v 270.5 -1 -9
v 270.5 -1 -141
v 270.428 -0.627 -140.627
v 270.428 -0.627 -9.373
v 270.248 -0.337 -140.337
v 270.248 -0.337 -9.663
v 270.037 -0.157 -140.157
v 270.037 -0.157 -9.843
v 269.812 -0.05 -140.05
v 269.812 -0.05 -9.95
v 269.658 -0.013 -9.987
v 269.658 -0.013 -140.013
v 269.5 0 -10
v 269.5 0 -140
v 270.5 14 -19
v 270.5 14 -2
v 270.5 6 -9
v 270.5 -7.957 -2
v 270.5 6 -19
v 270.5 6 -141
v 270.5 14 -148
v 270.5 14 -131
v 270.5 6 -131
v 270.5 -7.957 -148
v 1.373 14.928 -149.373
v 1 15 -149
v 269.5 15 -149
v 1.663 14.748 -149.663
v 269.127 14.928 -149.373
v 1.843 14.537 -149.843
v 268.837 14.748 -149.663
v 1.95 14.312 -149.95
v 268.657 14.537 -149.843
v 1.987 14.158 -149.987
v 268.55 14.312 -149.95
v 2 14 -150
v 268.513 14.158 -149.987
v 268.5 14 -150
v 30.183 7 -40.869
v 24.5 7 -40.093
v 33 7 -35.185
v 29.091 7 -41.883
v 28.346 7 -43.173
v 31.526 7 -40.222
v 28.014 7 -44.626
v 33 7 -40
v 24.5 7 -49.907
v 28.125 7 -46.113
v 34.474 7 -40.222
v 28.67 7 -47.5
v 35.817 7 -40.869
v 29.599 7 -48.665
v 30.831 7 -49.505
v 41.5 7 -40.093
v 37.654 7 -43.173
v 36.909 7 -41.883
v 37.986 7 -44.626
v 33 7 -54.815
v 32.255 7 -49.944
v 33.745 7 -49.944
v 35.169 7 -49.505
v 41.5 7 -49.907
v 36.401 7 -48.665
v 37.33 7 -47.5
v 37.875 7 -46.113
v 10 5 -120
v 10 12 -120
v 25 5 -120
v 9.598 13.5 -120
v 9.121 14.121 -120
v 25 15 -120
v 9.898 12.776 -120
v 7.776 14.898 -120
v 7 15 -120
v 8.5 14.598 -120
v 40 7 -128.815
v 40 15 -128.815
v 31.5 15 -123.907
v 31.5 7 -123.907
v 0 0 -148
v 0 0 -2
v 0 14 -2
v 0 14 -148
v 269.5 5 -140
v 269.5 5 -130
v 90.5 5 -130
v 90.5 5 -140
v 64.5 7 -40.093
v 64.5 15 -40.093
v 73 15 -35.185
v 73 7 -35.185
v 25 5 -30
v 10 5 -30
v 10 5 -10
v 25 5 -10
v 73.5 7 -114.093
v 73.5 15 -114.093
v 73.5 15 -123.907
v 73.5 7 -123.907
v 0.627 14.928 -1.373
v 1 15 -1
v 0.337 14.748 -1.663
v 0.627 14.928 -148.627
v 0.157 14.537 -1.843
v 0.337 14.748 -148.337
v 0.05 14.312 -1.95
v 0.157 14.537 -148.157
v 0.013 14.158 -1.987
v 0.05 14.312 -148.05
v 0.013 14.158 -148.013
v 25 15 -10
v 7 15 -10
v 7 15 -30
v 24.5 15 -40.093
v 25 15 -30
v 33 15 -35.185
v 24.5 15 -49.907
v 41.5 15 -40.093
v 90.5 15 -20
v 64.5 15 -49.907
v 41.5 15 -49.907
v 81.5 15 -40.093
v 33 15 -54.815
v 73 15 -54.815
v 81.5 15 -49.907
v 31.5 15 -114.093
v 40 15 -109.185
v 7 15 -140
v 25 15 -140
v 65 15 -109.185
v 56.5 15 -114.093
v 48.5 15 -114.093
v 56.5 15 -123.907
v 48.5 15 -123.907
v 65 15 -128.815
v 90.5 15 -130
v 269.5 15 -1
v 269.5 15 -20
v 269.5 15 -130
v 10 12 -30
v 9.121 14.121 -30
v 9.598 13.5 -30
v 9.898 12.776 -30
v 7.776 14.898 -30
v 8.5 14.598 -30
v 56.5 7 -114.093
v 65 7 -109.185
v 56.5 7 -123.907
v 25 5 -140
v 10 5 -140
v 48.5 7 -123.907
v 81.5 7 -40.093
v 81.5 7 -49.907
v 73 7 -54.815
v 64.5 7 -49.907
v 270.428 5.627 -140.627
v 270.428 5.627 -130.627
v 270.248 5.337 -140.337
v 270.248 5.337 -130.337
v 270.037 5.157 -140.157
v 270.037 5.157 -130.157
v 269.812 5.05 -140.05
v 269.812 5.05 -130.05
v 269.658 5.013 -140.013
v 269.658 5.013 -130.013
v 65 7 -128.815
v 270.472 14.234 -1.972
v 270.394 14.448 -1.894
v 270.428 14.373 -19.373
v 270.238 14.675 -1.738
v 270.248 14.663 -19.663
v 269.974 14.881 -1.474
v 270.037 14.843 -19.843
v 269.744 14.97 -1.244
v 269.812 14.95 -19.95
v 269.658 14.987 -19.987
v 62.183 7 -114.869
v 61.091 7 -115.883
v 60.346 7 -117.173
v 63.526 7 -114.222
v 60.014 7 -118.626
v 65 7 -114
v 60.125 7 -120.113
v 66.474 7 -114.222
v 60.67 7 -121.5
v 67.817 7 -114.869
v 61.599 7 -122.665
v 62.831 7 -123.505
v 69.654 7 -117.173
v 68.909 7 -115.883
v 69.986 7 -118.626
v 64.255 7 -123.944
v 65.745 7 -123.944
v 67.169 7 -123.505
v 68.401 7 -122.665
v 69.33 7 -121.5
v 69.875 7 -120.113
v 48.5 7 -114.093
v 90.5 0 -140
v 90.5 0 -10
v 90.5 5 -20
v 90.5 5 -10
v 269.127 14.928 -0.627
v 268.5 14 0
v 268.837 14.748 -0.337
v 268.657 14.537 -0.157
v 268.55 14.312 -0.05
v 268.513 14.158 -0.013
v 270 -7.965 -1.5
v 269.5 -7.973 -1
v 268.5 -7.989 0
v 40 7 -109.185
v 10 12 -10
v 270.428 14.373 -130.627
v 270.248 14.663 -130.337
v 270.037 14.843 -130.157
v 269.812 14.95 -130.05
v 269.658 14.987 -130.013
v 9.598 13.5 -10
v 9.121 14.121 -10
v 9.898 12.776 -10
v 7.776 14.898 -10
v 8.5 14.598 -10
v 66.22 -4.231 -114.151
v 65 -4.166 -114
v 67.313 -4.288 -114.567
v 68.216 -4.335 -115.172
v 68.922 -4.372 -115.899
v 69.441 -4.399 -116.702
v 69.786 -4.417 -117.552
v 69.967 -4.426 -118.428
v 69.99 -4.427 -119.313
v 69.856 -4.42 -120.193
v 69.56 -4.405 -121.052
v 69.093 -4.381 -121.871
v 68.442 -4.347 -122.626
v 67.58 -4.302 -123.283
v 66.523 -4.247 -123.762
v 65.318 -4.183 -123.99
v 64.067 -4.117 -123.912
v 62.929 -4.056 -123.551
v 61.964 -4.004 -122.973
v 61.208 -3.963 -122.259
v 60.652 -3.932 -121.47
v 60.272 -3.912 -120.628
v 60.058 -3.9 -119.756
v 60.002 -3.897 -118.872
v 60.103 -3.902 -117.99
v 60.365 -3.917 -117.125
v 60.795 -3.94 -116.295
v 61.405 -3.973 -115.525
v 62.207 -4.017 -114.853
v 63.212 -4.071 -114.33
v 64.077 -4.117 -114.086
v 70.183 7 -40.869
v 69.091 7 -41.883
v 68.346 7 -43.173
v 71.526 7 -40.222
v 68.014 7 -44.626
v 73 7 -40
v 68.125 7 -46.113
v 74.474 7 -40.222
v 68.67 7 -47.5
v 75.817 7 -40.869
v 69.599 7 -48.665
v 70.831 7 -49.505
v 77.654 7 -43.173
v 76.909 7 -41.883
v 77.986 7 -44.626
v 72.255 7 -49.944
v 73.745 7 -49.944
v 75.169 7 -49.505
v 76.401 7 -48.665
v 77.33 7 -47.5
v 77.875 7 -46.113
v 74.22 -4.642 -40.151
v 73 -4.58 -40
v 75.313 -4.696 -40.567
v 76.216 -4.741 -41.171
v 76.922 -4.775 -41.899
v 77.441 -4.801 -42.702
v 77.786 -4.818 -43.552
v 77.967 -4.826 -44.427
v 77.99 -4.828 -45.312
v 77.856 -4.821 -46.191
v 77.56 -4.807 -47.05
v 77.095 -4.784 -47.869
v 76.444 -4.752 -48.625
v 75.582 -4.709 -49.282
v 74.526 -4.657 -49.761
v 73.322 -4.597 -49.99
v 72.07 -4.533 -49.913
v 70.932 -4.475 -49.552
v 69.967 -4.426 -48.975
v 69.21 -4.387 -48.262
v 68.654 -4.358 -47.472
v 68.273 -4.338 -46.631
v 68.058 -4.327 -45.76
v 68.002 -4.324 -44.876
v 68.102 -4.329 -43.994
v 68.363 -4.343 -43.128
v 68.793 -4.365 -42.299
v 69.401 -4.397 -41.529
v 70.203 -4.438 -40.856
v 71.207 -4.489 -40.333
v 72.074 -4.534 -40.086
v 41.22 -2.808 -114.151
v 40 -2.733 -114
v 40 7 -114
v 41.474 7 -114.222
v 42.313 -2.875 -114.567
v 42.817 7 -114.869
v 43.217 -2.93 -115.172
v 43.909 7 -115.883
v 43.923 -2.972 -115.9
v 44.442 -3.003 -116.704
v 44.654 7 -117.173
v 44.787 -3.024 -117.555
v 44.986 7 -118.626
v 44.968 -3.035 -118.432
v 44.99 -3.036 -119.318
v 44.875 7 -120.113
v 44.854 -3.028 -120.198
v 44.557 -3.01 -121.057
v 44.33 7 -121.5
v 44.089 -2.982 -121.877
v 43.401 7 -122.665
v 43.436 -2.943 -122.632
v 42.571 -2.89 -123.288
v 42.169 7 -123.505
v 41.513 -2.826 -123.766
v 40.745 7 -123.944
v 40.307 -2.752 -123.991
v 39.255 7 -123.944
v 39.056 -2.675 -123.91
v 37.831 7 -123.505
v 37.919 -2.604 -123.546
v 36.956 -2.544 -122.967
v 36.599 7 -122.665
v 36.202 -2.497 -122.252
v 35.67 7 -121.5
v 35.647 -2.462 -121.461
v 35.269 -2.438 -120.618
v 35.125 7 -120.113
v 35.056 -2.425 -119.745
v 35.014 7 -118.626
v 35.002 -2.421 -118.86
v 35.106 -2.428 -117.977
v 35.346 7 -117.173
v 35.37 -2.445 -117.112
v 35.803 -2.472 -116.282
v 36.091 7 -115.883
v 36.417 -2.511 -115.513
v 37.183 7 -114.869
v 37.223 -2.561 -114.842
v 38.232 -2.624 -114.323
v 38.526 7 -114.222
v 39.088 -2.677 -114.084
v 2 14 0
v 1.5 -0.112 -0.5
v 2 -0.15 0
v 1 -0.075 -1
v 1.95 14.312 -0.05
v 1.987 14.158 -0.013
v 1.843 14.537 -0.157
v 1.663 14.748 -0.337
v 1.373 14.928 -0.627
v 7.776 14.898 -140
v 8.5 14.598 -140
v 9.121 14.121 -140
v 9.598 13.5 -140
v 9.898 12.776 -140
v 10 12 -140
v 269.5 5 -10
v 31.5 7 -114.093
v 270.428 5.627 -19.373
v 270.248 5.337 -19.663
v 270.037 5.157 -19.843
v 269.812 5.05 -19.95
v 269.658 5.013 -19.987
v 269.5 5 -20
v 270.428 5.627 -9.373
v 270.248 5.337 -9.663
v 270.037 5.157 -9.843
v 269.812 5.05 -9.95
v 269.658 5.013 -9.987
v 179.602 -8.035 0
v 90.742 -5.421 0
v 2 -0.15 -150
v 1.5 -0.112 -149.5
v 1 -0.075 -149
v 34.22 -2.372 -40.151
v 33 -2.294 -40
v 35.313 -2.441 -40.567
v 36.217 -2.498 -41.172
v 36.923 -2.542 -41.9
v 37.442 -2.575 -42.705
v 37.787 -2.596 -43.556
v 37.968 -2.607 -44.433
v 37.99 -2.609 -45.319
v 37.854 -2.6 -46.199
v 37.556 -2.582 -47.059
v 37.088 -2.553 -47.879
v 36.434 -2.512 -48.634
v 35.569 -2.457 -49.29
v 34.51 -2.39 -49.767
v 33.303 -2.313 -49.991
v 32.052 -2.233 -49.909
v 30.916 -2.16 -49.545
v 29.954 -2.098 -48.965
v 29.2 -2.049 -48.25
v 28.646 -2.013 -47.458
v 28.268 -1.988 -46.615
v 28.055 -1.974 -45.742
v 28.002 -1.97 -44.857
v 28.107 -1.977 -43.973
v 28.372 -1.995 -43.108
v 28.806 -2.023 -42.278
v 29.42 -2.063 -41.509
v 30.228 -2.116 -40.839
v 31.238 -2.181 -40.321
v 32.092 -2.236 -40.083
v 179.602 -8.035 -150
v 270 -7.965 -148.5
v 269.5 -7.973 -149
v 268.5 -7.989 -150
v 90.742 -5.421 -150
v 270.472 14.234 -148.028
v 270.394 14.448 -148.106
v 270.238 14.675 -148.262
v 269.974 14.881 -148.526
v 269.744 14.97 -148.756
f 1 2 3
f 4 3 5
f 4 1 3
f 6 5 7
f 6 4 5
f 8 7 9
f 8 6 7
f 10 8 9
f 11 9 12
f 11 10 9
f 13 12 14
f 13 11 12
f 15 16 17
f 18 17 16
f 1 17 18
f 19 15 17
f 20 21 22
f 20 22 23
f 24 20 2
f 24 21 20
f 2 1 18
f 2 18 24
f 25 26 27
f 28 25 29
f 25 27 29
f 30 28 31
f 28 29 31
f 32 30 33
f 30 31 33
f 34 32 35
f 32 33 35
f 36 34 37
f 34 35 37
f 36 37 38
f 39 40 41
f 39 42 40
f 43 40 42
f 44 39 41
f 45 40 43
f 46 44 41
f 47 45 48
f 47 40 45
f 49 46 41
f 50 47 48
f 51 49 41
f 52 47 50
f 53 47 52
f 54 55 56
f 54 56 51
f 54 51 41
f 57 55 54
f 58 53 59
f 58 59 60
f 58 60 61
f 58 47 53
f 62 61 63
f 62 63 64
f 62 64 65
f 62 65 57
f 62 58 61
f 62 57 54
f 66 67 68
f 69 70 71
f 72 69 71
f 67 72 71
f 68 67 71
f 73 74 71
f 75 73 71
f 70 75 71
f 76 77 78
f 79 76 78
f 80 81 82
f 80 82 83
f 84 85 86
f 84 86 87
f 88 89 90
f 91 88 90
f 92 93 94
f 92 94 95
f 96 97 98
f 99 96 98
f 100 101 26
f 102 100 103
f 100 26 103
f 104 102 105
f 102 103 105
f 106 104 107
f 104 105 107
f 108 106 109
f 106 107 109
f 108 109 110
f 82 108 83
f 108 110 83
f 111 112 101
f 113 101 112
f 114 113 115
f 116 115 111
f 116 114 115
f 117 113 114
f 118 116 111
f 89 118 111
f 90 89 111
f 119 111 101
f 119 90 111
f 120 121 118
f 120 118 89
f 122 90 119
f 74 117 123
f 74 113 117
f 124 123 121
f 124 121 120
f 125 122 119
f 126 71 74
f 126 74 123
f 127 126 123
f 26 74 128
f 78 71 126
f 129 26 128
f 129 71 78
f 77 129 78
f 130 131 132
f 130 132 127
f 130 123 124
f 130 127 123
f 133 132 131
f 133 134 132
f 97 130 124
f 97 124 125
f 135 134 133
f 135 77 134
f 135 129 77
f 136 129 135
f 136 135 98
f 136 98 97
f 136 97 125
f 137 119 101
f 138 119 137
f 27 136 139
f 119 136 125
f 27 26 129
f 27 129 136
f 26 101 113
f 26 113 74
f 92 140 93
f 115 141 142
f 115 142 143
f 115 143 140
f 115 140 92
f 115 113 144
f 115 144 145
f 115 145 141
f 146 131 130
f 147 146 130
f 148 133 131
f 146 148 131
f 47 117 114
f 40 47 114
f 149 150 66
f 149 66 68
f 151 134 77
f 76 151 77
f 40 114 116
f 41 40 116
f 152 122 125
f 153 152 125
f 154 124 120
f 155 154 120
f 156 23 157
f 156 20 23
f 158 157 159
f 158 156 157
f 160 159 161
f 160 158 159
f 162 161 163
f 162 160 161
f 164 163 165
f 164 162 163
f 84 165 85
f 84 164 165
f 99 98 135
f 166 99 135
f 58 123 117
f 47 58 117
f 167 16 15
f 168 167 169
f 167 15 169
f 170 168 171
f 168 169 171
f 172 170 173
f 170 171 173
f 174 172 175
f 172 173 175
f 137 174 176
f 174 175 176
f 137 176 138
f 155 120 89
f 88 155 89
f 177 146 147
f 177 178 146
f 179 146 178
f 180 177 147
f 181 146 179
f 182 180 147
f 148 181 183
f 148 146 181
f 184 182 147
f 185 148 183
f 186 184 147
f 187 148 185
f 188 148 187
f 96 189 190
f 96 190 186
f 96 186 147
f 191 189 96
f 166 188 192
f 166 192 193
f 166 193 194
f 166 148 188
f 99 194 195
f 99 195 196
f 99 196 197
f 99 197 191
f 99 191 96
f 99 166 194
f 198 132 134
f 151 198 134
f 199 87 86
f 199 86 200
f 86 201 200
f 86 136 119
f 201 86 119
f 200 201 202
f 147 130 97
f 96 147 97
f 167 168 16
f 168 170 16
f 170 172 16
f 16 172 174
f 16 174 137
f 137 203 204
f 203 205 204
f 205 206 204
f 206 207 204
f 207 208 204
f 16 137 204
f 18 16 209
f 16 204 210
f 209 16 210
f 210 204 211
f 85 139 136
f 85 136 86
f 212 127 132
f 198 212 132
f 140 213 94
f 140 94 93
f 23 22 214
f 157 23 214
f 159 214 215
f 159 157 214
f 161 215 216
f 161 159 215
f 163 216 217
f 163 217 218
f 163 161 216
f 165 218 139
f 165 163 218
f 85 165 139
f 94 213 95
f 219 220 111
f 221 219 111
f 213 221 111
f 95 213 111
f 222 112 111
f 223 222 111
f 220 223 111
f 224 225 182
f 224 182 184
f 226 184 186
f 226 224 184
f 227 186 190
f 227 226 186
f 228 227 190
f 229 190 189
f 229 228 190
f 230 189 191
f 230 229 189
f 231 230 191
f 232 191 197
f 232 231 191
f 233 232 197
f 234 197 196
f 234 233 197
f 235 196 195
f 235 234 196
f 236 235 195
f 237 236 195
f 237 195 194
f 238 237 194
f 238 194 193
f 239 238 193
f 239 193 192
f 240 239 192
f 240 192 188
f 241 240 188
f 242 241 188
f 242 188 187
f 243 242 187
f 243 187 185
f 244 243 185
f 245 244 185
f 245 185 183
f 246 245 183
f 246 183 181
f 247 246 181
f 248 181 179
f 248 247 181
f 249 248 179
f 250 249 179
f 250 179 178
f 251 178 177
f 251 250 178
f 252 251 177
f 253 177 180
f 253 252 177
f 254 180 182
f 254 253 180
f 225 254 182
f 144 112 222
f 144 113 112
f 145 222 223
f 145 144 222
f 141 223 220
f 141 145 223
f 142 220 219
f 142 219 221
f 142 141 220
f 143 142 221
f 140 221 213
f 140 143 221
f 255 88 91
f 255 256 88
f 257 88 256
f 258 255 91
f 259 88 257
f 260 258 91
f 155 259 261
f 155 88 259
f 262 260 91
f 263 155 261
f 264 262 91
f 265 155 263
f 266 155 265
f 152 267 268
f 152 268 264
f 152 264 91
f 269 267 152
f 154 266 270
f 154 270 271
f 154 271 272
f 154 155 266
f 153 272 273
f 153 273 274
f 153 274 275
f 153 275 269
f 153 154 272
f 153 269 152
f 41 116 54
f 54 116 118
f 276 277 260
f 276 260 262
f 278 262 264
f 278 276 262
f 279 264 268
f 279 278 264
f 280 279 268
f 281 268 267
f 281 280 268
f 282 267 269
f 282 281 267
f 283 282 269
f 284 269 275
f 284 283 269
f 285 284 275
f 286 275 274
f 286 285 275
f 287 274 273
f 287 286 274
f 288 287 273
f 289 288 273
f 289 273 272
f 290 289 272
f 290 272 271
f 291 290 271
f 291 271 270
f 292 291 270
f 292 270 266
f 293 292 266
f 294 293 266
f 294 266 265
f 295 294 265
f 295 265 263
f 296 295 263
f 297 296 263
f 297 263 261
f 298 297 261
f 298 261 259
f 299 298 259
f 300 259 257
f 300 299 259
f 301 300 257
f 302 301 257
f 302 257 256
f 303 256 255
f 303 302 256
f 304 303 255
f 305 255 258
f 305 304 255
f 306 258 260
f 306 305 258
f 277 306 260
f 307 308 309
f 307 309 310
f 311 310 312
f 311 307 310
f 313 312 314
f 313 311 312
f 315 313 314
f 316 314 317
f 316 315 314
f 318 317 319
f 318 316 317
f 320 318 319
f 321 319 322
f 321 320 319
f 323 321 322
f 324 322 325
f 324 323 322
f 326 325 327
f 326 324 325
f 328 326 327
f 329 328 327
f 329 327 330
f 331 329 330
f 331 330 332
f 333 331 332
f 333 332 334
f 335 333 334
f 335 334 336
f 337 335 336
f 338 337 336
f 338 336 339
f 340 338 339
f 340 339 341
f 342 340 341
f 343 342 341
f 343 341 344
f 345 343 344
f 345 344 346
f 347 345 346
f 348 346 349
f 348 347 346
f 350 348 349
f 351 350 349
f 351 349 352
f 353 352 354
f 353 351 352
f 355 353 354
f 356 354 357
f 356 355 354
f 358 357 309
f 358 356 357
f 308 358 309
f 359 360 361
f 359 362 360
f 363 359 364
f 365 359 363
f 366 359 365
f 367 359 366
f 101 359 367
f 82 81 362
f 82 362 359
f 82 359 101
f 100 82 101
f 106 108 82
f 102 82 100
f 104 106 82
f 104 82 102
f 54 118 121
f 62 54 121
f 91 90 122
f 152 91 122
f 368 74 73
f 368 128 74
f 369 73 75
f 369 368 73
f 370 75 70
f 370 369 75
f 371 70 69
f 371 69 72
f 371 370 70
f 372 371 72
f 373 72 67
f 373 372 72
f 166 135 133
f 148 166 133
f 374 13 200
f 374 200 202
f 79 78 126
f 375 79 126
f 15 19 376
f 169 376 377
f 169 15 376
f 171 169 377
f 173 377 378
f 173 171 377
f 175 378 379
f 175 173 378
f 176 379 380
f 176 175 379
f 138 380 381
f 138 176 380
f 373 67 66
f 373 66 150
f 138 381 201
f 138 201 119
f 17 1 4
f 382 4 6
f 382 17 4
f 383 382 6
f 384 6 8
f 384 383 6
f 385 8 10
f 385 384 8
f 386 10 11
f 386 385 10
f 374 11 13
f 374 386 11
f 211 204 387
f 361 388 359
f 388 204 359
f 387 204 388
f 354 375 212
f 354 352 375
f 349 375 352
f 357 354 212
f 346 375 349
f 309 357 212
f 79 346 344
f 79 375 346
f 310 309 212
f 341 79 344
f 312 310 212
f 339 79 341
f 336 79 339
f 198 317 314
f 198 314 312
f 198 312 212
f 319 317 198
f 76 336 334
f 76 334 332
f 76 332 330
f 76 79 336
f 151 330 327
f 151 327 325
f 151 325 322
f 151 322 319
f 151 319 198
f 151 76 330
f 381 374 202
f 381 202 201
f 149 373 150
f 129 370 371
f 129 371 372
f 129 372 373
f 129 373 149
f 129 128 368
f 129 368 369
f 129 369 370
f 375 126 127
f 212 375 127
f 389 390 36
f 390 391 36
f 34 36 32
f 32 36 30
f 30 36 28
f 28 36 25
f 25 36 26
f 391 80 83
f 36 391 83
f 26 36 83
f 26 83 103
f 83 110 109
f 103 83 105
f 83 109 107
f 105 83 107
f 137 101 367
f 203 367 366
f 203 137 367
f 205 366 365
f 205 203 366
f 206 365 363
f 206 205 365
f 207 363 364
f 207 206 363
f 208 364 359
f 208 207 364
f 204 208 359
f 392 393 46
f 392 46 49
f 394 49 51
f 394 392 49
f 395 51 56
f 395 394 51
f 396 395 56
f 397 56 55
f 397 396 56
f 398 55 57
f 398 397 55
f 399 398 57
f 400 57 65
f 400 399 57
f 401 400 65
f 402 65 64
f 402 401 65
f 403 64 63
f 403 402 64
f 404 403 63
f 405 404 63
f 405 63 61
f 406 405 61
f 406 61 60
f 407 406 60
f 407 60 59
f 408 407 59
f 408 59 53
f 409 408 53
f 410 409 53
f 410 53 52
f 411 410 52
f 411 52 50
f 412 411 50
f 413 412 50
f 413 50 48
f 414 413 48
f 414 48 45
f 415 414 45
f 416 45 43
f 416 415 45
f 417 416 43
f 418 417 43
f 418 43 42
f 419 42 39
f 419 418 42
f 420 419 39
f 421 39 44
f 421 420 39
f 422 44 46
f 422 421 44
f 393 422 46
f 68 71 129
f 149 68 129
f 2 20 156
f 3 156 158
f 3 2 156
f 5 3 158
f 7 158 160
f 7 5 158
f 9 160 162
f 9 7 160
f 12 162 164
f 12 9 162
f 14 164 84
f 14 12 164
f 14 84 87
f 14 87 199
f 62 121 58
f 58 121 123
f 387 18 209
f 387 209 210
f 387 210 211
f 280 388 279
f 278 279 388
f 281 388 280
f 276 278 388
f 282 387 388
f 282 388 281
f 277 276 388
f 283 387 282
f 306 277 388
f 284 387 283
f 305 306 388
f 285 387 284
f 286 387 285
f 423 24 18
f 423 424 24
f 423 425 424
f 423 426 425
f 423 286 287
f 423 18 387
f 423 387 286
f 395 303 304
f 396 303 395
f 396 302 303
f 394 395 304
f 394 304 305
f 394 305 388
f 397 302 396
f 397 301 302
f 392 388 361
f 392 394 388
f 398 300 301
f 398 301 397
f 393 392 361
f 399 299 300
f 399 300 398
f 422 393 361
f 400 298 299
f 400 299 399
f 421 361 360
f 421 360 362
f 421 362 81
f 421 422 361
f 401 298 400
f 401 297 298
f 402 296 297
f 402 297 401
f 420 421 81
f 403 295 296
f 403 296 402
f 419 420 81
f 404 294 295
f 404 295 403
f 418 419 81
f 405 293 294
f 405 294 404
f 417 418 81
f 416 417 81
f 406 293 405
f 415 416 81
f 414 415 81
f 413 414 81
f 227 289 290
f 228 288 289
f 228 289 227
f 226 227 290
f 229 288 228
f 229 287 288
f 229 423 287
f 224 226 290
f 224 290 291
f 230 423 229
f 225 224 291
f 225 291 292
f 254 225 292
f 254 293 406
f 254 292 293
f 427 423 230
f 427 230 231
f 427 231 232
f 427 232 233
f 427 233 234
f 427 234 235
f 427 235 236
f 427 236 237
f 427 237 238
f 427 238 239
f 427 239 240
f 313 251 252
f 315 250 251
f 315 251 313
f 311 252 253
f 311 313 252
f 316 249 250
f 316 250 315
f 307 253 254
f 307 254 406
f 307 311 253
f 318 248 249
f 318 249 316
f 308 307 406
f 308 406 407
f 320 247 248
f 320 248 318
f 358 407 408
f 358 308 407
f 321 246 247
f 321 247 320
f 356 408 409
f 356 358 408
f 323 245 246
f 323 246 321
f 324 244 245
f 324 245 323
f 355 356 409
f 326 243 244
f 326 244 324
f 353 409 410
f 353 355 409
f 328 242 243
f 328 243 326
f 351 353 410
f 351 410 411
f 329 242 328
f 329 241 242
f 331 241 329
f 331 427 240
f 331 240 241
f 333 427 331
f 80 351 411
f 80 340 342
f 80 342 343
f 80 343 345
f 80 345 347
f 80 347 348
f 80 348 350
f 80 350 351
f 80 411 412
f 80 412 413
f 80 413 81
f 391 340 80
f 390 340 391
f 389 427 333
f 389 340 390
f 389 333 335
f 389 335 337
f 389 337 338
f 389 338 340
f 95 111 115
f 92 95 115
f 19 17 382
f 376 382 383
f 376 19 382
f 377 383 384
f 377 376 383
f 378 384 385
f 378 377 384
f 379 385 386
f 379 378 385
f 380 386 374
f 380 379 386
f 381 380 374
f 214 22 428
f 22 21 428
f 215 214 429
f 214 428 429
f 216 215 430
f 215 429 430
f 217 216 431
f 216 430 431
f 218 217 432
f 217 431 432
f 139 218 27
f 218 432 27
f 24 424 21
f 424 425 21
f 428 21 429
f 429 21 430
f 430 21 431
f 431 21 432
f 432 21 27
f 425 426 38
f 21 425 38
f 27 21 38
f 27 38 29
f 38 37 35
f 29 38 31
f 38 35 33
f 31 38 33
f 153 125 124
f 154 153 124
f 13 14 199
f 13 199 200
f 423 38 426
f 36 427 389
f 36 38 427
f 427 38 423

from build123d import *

# Parameters (mm, degrees)
SKETCH1_W               = 270.5
SKETCH1_H               = 150
BOSS_EXTRUDE1_DEPTH     = 15
BOSS_EXTRUDE5_DEPTH     = 150
CUT_EXTRUDE7_DEPTH      = 311.185801218
CUT_EXTRUDE7_DEPTH_BACK = 311.185801218
SKETCH5_R               = 5
CUT_EXTRUDE8_DEPTH      = 8
CUT_EXTRUDE9_DEPTH      = 180
CHAMFER1_SIZE           = 2
SKETCH16_W              = 15
SKETCH16_H              = 20
CUT_EXTRUDE10_DEPTH     = 10
FILLET2_R               = 1
FILLET3_R               = 3


with BuildPart() as part:
    # Sketch1 → Boss-Extrude1 (new body)
    with BuildSketch(Plane(origin=(0, 0, 0), x_dir=(1, 0, 0), z_dir=(0, 1, 0))):
        with Locations((135.25, 75)):
            Rectangle(SKETCH1_W, SKETCH1_H)
    extrude(amount=BOSS_EXTRUDE1_DEPTH)

    # Sketch12 → Boss-Extrude5 (add)
    with BuildSketch(Plane.XY.offset(-150)):
        with BuildLine():
            Line((270.5, 0), (270.5, -7.956989195))
            ThreePointArc((270.5, -7.956989195), (135.159339828, -7.060511664), (0, 0))
            Line((0, 0), (270.5, 0))
        make_face()
    extrude(amount=BOSS_EXTRUDE5_DEPTH)

    # Sketch5 → Cut-Extrude7 (cut, two sides: drawn at the far end of the back side and taken through both)
    with BuildSketch(Plane(origin=(0, 15, 0), x_dir=(1, 0, 0), z_dir=(0, 1, 0)).offset(-CUT_EXTRUDE7_DEPTH_BACK)):
        with Locations(Location((33, 45, 0), (0, 0, 270))):
            Circle(SKETCH5_R)
        with Locations(Location((40, 119, 0), (0, 0, 270))):
            Circle(SKETCH5_R)
        with Locations(Location((65, 119, 0), (0, 0, 270))):
            Circle(SKETCH5_R)
        with Locations(Location((73, 45, 0), (0, 0, 270))):
            Circle(SKETCH5_R)
    extrude(amount=CUT_EXTRUDE7_DEPTH + CUT_EXTRUDE7_DEPTH_BACK, mode=Mode.SUBTRACT)

    # Sketch13 → Cut-Extrude8 (cut)
    with BuildSketch(Plane(origin=(0, 15, 0), x_dir=(1, 0, 0), z_dir=(0, 1, 0))):
        Polygon((40, 109.185045424), (48.5, 114.092522712), (48.5, 123.907477288), (40, 128.814954576), (31.5, 123.907477288), (31.5, 114.092522712), align=None)
        Polygon((65, 109.185045424), (73.5, 114.092522712), (73.5, 123.907477288), (65, 128.814954576), (56.5, 123.907477288), (56.5, 114.092522712), align=None)
        Polygon((33, 35.185045424), (41.5, 40.092522712), (41.5, 49.907477288), (33, 54.814954576), (24.5, 49.907477288), (24.5, 40.092522712), align=None)
        Polygon((73, 35.185045424), (81.5, 40.092522712), (81.5, 49.907477288), (73, 54.814954576), (64.5, 49.907477288), (64.5, 40.092522712), align=None)
    extrude(amount=-CUT_EXTRUDE8_DEPTH, mode=Mode.SUBTRACT)

    # Sketch15 → Cut-Extrude9 (cut)
    with BuildSketch(Plane(origin=(270.5, 0, 0), x_dir=(0, 0, -1), z_dir=(1, 0, 0))):
        Polygon((20, 15), (130, 15), (130, 5), (140, 5), (140, 0), (10, 0), (10, 5), (20, 5), align=None)
    extrude(amount=-CUT_EXTRUDE9_DEPTH, mode=Mode.SUBTRACT)

    # Chamfer1
    chamfer1_edges = [part.edges().sort_by_distance(p)[0] for p in [
        (0, 7.5, -150),
        (270.5, 3.521505402, -150),
        (270.5, 3.521505402, 0),
        (0, 7.5, 0),
    ]]
    chamfer(chamfer1_edges, length=CHAMFER1_SIZE)

    # Sketch16 → Cut-Extrude10 (cut)
    with BuildSketch(Plane(origin=(0, 15, 0), x_dir=(1, 0, 0), z_dir=(0, 1, 0))):
        with Locations((17.5, 20)):
            Rectangle(SKETCH16_W, SKETCH16_H)
        with Locations((17.5, 130)):
            Rectangle(SKETCH16_W, SKETCH16_H)
    extrude(amount=-CUT_EXTRUDE10_DEPTH, mode=Mode.SUBTRACT)

    # Fillet2
    fillet2_edges = [part.edges().sort_by_distance(p)[0] for p in [
        (270.5, 15, -139),
        (270.5, 10, -130),
        (270.5, 5, -135),
        (270.5, 2.5, -140),
        (270.5, 0, -75),
        (270.5, 2.5, -10),
        (270.5, 5, -15),
        (270.5, 10, -20),
        (270.5, 15, -11),
        (135.25, 15, -150),
        (135.25, 15, 0),
        (0, 15, -75),
    ]]
    fillet(fillet2_edges, radius=FILLET2_R - 0.0001)  # a hair under: the kernel refuses the full size

    # Fillet3
    fillet3_edges = [part.edges().sort_by_distance(p)[0] for p in [
        (10, 15, -130),
        (10, 15, -20),
    ]]
    fillet(fillet3_edges, radius=FILLET3_R)


solid = part.part
